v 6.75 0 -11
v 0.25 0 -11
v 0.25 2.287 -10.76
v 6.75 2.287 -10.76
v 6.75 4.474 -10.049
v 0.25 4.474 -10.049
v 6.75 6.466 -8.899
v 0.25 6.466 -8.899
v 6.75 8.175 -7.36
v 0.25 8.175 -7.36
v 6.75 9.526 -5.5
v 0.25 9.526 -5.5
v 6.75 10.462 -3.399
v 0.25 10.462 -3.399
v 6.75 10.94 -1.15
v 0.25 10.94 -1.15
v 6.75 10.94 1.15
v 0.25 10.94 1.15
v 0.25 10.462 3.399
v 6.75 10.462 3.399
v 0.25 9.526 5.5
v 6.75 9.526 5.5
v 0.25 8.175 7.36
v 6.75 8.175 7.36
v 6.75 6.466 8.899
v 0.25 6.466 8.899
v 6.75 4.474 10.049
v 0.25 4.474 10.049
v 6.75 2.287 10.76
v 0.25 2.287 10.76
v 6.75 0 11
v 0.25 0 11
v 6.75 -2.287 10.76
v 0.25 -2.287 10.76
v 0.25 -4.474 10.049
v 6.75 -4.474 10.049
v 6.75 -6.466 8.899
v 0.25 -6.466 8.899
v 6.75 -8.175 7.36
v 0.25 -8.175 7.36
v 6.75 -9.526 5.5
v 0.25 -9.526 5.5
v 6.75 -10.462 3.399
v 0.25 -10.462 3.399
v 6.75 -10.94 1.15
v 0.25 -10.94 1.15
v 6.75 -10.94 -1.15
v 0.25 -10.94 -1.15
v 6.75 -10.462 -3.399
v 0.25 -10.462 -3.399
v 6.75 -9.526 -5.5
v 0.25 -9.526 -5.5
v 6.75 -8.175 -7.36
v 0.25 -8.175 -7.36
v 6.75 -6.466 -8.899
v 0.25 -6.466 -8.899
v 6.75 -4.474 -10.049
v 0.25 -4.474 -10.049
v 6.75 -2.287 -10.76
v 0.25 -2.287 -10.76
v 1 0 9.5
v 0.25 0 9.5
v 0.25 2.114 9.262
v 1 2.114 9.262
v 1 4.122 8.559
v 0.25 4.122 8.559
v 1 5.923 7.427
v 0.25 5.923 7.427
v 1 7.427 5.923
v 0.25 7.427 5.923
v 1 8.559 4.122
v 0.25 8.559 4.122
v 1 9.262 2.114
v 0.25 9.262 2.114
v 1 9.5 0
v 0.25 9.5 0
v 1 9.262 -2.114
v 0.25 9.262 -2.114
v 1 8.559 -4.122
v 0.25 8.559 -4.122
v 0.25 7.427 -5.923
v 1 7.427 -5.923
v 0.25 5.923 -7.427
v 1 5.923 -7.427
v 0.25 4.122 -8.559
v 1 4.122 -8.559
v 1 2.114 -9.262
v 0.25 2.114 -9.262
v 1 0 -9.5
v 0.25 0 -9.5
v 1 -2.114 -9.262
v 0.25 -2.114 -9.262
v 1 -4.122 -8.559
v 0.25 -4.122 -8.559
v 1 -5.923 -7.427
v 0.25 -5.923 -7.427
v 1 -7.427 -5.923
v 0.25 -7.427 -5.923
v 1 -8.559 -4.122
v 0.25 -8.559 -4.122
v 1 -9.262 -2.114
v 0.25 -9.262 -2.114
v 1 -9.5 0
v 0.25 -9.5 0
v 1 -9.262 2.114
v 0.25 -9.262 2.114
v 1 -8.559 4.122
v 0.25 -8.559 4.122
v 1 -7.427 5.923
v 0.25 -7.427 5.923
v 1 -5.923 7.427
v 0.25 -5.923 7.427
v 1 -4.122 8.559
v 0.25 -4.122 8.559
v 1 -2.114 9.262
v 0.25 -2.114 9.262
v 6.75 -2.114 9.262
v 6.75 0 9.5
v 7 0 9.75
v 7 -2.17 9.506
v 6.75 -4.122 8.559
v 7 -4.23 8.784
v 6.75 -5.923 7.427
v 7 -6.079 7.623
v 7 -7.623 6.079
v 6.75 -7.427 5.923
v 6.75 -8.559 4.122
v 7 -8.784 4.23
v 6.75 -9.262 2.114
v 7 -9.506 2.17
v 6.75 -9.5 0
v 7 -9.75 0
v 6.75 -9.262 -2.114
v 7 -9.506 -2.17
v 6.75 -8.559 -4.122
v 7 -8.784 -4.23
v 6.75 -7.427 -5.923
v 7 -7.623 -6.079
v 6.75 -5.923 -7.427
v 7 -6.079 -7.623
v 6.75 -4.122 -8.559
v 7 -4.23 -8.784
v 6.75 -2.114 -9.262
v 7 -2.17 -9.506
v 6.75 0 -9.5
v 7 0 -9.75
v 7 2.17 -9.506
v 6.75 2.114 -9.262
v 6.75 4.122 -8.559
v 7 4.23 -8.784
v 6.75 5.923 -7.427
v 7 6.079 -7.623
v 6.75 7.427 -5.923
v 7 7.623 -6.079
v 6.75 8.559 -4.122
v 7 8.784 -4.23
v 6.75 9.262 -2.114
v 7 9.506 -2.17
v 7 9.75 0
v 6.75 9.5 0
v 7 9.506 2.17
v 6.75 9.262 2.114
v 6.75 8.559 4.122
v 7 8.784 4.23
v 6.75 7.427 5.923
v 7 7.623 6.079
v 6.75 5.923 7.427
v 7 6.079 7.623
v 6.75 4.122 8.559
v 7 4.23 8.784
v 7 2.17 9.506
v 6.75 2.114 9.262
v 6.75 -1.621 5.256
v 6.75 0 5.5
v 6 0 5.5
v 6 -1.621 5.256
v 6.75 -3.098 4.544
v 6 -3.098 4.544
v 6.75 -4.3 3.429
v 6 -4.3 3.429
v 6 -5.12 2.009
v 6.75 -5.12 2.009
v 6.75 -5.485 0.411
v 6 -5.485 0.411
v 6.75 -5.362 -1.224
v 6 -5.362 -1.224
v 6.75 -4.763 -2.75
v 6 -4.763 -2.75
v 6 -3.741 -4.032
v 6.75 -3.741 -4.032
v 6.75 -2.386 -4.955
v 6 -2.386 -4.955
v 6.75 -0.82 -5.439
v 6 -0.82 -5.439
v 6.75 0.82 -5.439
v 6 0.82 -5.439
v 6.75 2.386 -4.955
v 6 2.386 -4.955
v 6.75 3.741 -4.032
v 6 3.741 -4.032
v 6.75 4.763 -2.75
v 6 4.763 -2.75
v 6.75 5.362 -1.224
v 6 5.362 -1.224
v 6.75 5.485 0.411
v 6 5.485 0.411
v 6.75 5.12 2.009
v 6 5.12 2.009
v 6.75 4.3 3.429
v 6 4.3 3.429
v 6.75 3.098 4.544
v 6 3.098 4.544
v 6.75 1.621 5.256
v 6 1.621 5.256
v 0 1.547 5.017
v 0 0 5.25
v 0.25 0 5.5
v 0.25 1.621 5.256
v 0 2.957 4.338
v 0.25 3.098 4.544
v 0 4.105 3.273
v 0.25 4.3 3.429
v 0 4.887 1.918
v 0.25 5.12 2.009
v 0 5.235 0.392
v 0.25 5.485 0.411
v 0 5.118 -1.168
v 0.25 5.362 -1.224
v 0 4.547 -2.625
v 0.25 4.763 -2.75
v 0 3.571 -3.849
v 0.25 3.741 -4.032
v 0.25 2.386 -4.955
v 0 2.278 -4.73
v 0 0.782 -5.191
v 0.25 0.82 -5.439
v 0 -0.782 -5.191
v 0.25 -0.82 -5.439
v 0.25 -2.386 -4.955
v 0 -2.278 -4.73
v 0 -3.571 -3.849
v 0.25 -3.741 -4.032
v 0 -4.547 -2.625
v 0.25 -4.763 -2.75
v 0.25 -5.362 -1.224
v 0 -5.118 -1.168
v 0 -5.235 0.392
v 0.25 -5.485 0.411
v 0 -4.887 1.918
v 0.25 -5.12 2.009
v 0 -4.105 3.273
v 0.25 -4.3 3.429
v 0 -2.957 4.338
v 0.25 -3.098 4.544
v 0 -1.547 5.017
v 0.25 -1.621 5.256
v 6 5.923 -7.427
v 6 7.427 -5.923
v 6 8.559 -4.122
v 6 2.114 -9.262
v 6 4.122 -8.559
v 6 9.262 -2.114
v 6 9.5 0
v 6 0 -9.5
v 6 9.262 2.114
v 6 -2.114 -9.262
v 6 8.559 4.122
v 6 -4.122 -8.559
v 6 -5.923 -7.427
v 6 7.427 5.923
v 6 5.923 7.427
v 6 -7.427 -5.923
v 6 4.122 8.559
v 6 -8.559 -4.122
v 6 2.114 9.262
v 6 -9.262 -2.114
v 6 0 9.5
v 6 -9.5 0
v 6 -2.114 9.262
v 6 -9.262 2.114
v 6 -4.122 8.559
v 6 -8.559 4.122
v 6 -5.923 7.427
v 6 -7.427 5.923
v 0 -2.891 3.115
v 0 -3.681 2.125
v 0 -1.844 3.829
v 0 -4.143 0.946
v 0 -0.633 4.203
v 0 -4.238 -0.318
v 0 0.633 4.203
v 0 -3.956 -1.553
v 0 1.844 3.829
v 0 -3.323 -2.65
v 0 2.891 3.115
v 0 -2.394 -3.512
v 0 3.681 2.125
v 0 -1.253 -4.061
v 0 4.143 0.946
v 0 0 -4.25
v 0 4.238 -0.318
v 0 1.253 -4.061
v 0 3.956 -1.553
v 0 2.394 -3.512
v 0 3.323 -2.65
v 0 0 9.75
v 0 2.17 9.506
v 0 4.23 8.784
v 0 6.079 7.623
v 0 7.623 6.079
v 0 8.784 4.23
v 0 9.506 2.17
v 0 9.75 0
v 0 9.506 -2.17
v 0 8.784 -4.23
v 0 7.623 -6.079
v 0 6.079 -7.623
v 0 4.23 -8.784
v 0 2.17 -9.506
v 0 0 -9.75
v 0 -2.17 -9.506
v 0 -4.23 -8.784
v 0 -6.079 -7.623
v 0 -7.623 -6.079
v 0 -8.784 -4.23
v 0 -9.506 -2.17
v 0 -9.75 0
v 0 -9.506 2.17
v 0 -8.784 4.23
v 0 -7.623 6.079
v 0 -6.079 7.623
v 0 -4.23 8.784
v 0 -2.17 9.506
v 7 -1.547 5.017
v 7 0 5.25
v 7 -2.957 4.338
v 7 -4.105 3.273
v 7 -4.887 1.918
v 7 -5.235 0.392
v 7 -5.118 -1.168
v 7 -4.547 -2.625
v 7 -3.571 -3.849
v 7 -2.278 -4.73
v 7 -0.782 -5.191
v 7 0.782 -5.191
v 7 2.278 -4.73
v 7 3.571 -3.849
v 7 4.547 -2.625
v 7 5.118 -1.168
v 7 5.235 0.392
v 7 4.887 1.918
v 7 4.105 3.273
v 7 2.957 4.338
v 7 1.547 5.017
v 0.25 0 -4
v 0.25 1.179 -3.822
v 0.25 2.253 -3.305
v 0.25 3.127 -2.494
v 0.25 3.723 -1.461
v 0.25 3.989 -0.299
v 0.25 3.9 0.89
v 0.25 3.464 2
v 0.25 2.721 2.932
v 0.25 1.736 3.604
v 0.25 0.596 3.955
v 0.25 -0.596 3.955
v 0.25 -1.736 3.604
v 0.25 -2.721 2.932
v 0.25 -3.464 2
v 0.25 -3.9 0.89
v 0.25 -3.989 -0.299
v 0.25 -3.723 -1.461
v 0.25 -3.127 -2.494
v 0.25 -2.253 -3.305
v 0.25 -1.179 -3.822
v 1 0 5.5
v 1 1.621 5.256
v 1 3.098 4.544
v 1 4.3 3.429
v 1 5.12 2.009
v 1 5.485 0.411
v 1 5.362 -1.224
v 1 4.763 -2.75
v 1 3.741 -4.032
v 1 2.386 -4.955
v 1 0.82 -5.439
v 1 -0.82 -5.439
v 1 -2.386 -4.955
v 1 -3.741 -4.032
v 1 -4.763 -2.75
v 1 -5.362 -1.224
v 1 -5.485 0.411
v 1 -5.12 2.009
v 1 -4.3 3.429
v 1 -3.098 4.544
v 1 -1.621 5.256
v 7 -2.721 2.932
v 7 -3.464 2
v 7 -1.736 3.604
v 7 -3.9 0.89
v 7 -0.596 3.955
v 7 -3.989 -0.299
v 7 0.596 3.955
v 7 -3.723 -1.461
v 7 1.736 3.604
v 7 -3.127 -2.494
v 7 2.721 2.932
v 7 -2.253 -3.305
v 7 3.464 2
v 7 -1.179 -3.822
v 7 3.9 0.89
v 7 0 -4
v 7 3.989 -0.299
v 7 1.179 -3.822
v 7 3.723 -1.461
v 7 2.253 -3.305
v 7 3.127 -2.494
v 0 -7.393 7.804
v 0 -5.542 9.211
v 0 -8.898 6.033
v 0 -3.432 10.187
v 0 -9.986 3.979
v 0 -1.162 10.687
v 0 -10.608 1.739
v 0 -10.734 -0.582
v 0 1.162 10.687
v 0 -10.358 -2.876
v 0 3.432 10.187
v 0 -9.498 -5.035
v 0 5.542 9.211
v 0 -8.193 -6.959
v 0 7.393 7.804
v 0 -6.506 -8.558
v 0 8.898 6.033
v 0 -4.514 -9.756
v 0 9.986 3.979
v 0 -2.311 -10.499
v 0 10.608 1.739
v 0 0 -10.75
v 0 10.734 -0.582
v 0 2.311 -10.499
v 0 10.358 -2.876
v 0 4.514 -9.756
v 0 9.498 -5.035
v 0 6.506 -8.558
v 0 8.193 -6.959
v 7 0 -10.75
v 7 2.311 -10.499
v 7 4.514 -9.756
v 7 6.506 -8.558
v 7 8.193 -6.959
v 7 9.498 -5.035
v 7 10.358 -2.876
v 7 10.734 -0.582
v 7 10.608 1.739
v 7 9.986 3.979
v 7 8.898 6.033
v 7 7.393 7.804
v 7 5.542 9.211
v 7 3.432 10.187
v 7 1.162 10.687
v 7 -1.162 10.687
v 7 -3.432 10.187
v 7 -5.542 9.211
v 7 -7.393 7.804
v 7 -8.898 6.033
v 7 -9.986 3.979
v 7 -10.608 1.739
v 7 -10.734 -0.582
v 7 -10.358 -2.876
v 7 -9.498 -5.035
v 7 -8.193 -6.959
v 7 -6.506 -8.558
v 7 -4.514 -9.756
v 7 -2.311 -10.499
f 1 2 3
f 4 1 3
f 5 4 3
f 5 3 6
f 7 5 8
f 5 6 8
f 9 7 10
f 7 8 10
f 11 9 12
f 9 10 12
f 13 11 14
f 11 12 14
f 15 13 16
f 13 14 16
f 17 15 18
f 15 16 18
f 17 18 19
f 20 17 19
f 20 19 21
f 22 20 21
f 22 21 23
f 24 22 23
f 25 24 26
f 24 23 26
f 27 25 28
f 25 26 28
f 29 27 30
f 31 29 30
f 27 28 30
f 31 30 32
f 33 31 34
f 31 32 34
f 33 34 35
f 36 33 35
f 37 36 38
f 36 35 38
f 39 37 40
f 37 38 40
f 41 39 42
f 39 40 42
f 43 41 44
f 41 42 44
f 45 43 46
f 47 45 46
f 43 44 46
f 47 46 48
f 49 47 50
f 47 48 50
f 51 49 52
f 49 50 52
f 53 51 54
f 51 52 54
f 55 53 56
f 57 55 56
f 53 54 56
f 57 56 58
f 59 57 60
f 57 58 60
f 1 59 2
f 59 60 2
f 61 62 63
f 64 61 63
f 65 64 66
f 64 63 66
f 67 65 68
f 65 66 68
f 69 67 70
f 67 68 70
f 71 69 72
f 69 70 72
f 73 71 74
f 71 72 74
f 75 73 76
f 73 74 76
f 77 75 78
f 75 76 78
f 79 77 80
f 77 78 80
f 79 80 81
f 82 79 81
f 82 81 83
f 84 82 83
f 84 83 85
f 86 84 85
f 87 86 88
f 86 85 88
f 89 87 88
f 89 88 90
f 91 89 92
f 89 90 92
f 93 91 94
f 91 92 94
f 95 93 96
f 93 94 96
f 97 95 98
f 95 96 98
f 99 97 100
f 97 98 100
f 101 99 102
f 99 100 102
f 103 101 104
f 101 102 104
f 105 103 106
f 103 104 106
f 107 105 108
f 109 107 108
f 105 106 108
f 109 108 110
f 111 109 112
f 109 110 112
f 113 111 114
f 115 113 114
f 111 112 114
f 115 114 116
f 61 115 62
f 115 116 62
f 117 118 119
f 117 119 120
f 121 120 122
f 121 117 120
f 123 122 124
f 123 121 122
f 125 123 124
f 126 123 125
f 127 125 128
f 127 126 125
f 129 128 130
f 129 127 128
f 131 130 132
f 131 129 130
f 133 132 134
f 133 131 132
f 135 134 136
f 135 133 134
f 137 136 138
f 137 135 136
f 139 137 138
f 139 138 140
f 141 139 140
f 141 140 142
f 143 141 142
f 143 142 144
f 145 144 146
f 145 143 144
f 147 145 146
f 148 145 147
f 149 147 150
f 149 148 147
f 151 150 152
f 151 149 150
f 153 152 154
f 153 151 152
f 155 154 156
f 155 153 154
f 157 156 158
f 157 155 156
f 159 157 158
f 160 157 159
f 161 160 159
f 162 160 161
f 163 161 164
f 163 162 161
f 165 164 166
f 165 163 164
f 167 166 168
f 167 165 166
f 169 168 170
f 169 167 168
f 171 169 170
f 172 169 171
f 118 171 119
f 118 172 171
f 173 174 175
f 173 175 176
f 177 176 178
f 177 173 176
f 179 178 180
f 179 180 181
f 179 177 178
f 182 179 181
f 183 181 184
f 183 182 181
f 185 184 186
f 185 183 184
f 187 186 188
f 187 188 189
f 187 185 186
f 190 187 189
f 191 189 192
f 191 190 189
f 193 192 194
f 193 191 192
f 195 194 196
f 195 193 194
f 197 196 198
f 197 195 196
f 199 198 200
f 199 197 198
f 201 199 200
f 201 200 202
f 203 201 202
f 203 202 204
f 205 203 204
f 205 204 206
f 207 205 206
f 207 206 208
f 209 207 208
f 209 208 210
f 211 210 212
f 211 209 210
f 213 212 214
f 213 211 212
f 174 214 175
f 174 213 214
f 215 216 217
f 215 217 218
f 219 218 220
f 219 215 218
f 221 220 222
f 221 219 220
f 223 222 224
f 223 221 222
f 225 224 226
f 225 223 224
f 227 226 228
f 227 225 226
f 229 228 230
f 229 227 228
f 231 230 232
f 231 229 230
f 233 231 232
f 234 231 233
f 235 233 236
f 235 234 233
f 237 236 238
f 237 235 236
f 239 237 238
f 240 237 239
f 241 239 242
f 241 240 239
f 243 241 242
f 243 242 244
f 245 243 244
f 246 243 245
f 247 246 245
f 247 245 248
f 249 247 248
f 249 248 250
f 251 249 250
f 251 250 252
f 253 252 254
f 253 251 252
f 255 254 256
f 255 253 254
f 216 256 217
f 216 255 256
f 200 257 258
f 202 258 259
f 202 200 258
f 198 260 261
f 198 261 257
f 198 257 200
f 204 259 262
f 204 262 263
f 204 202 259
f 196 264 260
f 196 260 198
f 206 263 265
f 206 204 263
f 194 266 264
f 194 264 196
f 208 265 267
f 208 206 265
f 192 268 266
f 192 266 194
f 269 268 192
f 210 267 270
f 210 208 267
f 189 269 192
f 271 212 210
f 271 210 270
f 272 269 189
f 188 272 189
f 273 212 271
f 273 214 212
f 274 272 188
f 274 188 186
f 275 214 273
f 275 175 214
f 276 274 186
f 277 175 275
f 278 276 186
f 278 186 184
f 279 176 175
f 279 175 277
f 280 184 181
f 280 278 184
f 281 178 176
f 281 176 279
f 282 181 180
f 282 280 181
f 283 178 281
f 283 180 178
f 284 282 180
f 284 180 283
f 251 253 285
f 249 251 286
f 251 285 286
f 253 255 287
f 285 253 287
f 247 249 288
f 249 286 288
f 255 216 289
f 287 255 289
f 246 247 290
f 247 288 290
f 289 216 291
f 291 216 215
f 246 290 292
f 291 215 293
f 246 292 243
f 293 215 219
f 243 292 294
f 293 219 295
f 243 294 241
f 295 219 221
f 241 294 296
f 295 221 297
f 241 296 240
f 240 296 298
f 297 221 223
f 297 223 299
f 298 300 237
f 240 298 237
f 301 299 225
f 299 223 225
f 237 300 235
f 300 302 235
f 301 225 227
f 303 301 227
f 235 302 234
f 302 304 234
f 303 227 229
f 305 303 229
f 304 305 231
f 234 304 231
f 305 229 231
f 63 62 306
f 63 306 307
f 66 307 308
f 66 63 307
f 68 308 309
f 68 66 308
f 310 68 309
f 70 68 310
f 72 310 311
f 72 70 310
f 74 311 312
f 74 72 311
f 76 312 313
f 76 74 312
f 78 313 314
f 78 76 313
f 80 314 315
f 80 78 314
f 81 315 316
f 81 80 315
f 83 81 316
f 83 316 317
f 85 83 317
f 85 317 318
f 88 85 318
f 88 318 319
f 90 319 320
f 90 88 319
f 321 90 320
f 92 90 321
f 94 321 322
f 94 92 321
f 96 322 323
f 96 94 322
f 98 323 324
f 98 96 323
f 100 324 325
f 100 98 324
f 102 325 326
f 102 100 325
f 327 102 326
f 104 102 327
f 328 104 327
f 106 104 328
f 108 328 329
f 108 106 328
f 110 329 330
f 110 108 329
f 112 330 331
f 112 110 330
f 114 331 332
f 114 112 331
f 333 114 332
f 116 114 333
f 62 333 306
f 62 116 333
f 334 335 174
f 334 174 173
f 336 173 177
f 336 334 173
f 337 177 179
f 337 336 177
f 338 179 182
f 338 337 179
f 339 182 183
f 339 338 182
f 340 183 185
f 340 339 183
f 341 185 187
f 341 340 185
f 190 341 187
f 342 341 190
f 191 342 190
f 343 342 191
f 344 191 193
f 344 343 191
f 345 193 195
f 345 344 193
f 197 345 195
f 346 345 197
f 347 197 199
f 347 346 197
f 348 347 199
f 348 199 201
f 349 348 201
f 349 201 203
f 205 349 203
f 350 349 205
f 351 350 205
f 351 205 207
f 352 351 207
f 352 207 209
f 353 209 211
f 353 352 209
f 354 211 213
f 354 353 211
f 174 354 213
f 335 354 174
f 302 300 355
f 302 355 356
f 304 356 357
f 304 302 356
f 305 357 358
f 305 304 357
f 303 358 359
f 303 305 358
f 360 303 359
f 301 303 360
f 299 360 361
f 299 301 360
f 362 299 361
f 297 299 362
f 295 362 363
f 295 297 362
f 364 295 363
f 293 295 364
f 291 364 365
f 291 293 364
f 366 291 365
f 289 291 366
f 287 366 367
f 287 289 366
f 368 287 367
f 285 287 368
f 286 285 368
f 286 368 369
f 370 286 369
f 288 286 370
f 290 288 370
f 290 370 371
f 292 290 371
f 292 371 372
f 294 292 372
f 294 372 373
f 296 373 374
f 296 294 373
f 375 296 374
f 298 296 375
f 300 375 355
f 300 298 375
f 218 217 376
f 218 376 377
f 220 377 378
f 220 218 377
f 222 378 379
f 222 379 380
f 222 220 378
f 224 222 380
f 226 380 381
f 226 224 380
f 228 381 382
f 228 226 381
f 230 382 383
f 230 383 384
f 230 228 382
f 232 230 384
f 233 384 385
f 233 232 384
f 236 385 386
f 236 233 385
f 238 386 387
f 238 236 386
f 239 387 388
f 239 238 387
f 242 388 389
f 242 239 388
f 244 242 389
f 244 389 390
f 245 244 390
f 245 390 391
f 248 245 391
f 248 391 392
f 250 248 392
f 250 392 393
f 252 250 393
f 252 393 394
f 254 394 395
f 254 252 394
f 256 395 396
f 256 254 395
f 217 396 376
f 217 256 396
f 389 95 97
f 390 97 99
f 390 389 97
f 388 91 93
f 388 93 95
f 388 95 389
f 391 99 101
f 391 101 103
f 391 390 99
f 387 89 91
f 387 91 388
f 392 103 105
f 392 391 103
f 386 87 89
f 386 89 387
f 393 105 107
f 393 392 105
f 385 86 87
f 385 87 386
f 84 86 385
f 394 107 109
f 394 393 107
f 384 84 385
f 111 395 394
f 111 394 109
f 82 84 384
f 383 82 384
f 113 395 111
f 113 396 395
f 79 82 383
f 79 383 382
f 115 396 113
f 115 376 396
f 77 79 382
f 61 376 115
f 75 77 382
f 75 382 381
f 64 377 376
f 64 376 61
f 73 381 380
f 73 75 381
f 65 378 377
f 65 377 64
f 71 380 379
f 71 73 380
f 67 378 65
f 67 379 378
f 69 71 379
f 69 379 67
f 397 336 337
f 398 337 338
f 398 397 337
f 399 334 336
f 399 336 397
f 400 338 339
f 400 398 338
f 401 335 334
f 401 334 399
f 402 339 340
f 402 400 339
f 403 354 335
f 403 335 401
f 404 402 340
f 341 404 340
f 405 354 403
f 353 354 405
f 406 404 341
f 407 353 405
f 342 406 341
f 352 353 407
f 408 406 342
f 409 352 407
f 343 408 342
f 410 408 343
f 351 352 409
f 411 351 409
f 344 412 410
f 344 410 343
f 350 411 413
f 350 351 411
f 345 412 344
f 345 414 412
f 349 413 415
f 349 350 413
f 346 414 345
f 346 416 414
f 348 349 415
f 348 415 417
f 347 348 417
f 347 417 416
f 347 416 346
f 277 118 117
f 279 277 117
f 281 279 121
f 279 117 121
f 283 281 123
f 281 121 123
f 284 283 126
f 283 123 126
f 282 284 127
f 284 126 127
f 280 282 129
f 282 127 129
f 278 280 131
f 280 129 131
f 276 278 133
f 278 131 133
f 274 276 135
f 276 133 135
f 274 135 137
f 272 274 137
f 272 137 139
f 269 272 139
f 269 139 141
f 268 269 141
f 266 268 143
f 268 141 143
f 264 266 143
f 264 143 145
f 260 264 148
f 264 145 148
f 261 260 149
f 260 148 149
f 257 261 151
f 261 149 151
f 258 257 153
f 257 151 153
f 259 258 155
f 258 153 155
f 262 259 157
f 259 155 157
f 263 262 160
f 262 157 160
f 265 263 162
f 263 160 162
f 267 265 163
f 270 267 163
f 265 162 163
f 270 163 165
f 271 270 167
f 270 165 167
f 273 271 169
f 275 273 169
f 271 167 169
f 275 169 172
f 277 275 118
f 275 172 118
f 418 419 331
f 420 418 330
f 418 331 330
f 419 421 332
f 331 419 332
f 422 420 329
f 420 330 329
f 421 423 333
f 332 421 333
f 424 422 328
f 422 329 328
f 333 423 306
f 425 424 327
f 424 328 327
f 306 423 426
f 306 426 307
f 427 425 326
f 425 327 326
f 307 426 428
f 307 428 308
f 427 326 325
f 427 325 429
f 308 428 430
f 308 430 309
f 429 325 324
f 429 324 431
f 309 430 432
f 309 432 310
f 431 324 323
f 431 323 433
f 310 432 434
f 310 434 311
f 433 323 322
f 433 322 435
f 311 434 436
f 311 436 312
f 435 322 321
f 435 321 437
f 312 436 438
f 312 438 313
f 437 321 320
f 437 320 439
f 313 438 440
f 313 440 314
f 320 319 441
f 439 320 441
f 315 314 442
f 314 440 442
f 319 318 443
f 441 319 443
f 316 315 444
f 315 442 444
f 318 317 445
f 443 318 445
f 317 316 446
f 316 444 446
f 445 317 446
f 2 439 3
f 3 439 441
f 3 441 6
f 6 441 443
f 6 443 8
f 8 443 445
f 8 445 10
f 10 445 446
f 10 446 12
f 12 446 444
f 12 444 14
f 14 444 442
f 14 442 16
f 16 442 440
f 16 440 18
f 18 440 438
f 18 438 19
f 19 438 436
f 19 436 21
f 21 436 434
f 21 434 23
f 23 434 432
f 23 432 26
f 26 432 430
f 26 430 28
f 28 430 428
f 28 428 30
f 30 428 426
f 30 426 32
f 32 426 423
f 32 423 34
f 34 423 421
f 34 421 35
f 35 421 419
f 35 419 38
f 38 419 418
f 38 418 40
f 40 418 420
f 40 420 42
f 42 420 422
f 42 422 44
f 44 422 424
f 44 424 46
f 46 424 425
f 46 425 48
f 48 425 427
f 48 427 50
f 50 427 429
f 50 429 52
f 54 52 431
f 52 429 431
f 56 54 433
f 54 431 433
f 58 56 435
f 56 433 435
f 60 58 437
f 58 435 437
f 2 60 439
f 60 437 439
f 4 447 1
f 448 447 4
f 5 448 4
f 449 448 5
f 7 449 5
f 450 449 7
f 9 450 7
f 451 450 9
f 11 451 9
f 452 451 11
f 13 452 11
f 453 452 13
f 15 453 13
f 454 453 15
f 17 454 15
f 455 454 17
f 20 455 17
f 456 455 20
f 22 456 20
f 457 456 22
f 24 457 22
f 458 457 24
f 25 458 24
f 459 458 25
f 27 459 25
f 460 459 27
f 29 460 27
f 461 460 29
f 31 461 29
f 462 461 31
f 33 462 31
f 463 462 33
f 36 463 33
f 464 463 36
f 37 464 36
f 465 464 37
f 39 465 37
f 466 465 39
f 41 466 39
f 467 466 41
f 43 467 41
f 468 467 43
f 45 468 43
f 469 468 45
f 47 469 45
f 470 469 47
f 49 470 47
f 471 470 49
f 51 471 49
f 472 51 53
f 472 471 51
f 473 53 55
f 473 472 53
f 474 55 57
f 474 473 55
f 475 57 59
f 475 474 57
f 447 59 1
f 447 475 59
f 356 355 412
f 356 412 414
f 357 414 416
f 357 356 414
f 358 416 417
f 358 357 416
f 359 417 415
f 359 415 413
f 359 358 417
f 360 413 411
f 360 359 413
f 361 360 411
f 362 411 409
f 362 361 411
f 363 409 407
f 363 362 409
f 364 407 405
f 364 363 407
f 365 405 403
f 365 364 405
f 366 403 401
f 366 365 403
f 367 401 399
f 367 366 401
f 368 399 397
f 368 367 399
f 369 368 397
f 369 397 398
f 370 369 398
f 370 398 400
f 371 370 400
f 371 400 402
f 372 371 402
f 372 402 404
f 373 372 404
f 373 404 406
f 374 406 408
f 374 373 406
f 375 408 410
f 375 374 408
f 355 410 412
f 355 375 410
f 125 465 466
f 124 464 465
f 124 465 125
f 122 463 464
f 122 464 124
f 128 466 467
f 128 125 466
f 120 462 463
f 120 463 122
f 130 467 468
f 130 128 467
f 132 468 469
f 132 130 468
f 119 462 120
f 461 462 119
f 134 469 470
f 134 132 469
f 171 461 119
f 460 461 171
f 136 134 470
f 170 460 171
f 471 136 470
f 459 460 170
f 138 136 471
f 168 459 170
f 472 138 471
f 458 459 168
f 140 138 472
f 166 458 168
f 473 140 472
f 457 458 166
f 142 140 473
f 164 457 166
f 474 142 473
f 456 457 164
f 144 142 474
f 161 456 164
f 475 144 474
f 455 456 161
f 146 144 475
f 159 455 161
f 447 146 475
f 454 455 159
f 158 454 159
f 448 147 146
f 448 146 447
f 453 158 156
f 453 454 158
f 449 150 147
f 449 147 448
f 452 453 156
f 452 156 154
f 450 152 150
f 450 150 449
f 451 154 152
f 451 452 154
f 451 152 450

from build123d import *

# Parameters (mm, degrees)
SKETCH1_R          = 11
SKETCH1_R_2        = 4
EXTRUDE1_DEPTH     = 7
CHAMFER1_SIZE      = 0.25
SKETCH2_R          = 9.5
SKETCH2_R_2        = 5.5
CUT_EXTRUDE1_DEPTH = 1
SKETCH3_R          = 9.5
SKETCH3_R_2        = 5.5
CUT_EXTRUDE2_DEPTH = 1
CHAMFER2_SIZE      = 0.25


with BuildPart() as part:
    # Sketch1 → Extrude1 (new body)
    with BuildSketch(Plane(origin=(0, 0, 0), x_dir=(0, 0, -1), z_dir=(1, 0, 0))):
        Circle(SKETCH1_R)
        Circle(SKETCH1_R_2, mode=Mode.SUBTRACT)
    extrude(amount=EXTRUDE1_DEPTH)

    # Chamfer1
    chamfer1_edges = [part.edges().sort_by_distance(p)[0] for p in [
        (0, 0, 11),
        (7, 0, 11),
        (0, 0, 4),
    ]]
    chamfer(chamfer1_edges, length=CHAMFER1_SIZE)

    # Sketch2 → Cut-Extrude1 (cut)
    with BuildSketch(Plane.ZY):
        Circle(SKETCH2_R)
        Circle(SKETCH2_R_2, mode=Mode.SUBTRACT)
    extrude(amount=-CUT_EXTRUDE1_DEPTH, mode=Mode.SUBTRACT)

    # Sketch3 → Cut-Extrude2 (cut)
    with BuildSketch(Plane(origin=(7, 0, 0), x_dir=(0, 0, -1), z_dir=(1, 0, 0))):
        with Locations(Location((0, 0, 0), (0, 0, 180))):  # turned: the seam where the file's is
            Circle(SKETCH3_R)
        with Locations(Location((0, 0, 0), (0, 0, 180))):  # turned: the seam where the file's is
            Circle(SKETCH3_R_2, mode=Mode.SUBTRACT)
    extrude(amount=-CUT_EXTRUDE2_DEPTH, mode=Mode.SUBTRACT)

    # Chamfer2
    chamfer2_edges = [part.edges().sort_by_distance(p)[0] for p in [
        (0, 0, -9.5),
        (0, 0, -5.5),
        (7, 0, -9.5),
        (7, 0, -5.5),
    ]]
    chamfer(chamfer2_edges, length=CHAMFER2_SIZE)


solid = part.part
